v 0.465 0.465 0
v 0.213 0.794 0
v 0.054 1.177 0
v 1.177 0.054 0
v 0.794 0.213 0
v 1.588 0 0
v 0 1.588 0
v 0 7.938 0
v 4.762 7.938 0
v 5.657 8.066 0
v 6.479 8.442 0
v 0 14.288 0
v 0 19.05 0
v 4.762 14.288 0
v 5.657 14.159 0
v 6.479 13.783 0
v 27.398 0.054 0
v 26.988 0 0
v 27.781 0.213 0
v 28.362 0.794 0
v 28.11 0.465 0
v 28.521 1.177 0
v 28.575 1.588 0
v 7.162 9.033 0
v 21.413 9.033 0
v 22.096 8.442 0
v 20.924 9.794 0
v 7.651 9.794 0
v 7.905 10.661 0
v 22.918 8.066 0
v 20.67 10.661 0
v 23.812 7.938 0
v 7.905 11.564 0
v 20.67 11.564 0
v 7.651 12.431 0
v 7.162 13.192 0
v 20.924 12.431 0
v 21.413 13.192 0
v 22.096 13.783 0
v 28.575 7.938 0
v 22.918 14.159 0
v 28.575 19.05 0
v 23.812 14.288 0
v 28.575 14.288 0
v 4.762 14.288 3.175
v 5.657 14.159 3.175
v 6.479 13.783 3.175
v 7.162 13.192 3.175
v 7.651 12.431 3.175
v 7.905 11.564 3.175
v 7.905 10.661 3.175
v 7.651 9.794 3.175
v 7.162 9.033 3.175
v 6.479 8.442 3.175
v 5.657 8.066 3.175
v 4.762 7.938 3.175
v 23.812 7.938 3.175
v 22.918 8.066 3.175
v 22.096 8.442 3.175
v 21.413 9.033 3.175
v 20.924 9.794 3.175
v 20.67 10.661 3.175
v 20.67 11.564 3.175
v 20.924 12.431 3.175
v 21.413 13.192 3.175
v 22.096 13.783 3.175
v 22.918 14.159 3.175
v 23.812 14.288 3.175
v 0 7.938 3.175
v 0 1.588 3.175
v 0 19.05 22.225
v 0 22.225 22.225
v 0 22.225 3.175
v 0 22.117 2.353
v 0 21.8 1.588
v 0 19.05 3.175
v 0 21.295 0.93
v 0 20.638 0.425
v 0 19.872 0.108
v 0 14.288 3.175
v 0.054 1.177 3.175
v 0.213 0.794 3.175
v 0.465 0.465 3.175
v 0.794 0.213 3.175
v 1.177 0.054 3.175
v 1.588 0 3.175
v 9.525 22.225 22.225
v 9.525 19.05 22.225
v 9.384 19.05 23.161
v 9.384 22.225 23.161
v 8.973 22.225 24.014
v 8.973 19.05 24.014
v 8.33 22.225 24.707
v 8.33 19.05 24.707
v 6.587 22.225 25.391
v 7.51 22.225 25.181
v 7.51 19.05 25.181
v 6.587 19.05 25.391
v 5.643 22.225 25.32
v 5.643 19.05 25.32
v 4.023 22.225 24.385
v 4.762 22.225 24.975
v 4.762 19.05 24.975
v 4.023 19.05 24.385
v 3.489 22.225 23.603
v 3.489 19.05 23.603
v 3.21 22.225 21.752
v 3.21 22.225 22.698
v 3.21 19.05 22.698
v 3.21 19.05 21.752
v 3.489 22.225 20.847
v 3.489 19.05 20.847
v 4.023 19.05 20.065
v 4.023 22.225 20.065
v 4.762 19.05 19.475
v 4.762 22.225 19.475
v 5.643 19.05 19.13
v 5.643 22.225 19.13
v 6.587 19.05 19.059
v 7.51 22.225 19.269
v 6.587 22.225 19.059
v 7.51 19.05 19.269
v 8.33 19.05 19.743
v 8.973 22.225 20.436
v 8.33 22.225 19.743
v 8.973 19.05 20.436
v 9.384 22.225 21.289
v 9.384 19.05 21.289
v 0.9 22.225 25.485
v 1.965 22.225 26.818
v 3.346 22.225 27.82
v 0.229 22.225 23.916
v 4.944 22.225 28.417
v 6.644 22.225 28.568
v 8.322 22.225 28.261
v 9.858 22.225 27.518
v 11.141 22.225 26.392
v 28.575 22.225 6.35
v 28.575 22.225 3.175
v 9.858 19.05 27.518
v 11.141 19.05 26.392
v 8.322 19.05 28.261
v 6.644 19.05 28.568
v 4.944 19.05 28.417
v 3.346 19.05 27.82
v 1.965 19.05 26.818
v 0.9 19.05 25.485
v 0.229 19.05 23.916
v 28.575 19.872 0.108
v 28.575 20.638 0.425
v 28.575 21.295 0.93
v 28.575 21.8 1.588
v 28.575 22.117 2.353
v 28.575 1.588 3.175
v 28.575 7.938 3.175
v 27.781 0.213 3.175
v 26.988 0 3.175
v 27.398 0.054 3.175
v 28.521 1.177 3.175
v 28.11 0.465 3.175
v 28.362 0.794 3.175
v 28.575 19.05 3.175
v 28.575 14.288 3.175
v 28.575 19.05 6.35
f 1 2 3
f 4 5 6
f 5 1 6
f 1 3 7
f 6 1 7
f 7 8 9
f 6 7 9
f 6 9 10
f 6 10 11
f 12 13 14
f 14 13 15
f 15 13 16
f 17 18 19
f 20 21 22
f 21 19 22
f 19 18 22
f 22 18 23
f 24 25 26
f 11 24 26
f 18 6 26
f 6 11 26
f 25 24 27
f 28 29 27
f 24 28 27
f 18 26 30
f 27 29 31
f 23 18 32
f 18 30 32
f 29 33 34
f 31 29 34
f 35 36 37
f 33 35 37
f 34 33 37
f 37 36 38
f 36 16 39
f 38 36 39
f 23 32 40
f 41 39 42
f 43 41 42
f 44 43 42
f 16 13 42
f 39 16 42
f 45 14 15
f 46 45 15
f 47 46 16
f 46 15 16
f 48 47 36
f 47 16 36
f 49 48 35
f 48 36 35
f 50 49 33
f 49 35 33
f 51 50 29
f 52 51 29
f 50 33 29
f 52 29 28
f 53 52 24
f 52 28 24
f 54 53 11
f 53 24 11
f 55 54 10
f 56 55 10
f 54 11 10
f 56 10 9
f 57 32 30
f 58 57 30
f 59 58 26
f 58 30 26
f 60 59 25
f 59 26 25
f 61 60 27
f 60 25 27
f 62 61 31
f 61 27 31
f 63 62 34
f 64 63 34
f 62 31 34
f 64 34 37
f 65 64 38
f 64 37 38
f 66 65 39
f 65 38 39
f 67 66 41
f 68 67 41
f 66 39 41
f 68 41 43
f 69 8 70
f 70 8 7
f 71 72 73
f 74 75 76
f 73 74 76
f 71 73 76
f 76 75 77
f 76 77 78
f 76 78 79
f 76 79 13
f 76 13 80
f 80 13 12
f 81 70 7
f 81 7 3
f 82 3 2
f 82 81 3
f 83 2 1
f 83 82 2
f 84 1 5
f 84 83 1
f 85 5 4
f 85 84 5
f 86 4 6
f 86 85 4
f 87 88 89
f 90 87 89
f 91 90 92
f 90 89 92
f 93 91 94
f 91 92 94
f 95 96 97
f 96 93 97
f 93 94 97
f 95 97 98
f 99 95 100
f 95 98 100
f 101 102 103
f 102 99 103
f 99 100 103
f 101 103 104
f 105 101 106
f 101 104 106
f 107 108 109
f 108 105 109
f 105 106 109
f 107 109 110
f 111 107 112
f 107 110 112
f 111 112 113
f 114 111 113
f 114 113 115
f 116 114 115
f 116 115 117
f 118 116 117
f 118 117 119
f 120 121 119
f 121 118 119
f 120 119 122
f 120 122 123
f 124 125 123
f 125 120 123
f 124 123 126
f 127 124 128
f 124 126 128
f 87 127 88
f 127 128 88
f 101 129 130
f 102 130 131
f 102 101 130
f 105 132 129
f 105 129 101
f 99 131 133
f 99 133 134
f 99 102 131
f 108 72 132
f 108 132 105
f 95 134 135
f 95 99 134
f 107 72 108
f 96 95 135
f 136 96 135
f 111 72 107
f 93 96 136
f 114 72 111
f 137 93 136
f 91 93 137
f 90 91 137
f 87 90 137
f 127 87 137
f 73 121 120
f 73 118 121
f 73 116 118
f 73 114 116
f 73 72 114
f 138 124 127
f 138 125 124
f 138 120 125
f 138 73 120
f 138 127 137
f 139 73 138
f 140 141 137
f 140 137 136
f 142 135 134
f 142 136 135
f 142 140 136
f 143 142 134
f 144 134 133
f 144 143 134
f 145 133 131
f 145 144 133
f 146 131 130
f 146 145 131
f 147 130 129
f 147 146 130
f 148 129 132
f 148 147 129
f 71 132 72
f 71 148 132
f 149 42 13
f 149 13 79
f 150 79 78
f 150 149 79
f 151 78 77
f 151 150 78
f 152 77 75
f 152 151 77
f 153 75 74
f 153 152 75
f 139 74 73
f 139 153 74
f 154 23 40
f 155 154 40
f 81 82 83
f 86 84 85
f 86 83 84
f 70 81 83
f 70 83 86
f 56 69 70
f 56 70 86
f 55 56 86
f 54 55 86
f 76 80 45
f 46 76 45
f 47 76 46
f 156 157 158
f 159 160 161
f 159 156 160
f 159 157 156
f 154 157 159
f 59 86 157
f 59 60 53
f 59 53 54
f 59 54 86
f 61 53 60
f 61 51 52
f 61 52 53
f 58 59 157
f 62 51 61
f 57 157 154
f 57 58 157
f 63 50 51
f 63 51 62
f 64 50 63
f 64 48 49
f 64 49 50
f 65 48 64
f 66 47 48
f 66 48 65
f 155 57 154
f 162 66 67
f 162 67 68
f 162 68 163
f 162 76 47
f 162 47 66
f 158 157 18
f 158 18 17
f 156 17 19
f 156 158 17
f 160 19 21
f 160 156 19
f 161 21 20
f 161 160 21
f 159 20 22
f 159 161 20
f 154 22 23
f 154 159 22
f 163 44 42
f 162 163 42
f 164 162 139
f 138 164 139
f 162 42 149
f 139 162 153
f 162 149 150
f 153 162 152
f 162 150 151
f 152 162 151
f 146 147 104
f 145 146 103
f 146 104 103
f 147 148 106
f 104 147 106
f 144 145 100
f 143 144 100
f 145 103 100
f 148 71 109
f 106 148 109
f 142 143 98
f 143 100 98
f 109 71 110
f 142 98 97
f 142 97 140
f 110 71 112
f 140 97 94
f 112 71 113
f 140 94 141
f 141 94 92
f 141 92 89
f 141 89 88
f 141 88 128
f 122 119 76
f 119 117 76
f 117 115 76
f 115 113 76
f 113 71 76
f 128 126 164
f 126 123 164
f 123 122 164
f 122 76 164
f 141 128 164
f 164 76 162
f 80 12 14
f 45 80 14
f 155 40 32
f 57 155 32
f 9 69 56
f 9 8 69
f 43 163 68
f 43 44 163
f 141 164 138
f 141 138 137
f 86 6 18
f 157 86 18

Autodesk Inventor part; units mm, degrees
ref_plane "YZ Plane" through (0, 0, 0) normal (1, 0, 0) x (0, 1, 0)
ref_plane "XZ Plane" through (0, 0, 0) normal (0, 1, 0) x (-1, 0, 0)
ref_plane "XY Plane" through (0, 0, 0) normal (0, 0, 1) x (1, 0, 0)
sketch "Sketch1" plane through (0, 0, 0) normal (0, 0, 1) x (1, 0, 0)
  line L0 (0, 0) -> (28.575, 0)
  line L1 (28.575, 0) -> (28.575, 19.05)
  line L2 (28.575, 19.05) -> (0, 19.05)
  line L3 (0, 19.05) -> (0, 0)
  arc A0 (23.8125, 14.2875) -> (23.8125, 7.9375) centre (23.8125, 11.1125) ccw
  arc A1 (4.7625, 7.9375) -> (4.7625, 14.2875) centre (4.7625, 11.1125) ccw
  line L4 (0, 7.9375) -> (4.7625, 7.9375)
  line L5 (0, 14.2875) -> (4.7625, 14.2875)
  line L6 (28.575, 14.2875) -> (23.8125, 14.2875)
  line L7 (28.575, 7.9375) -> (23.8125, 7.9375)
  dimension "d4" = 28.575
  dimension "d5" = 19.05
  dimension "d18" = 7.9375
  dimension "d19" = 4.7625
  dimension "d20" = 7.9375
  dimension "d21" = 4.7625
  dimension "d22" = 6.35
  dimension "d23" = 6.35
  dimension "d24" = 4.7625
  dimension "d25" = 4.7625
  dimension "d26" = 4.7625
  dimension "d27" = 4.7625
extrude "Extrusion1" add sketch "Sketch1" along normal blind 3.175
sketch "Sketch3" plane through (0, 19.05, 0) normal (0, 1, 0) x (1, 0, 0)
  line L0 (0, 0) -> (28.575, 0) projected
  line L1 (0, 0) -> (28.575, 0)
  line L2 (28.575, 0) -> (28.575, -6.35)
  line L3 (28.575, -6.35) -> (0, -6.35)
  line L4 (0, 0) -> (0, -3.175) projected
  line L5 (0, 0) -> (0, -22.225)
  circle A0 centre (6.35, -22.225) radius 6.35
  line L6 (28.575, -6.35) -> (11.1411, -26.3925)
  circle A1 centre (6.35, -22.225) radius 3.175
  dimension "d6" = 6.35
  dimension "d8" = 22.225
  dimension "d10" = 28.575
  dimension "d12" = 12.7
  dimension "d13" = 6.35
  dimension "d16" = 6.35
extrude "Extrusion2" add sketch "Sketch3" along normal blind 3.175
fillet "Fillet1" radius 3.175 1 edges at (14.2875, 22.225, 0)
sketch "Sketch4" plane through (0, 0, 0) normal (0, 0, -1) x (-1, 0, 0)
  arc A0 (-23.8125, 7.9375) -> (-23.8125, 14.2875) centre (-23.8125, 11.1125) ccw
  arc A1 (-4.7625, 14.2875) -> (-4.7625, 7.9375) centre (-4.7625, 11.1125) ccw
  line L0 (-28.575, 19.05) -> (0, 19.05) projected
  line L1 (-28.575, 0) -> (-28.575, 19.05) projected
  line L2 (0, 0) -> (0, 19.05) projected
  line L3 (-28.575, 0) -> (-28.575, 19.05) projected
  line L4 (-28.575, 14.2875) -> (-23.8125, 14.2875)
  line L5 (-28.575, 7.9375) -> (-23.8125, 7.9375)
  line L6 (0, 19.05) -> (0, 0) projected
  line L7 (0, 14.2875) -> (-4.7625, 14.2875)
  line L8 (0, 7.9375) -> (-4.7625, 7.9375)
  dimension "d28" = 6.35
  dimension "d29" = 6.35
  dimension "d30" = 7.9375
  dimension "d31" = 7.9375
  dimension "d32" = 4.7625
  dimension "d33" = 4.7625
  dimension "d34" = 4.7625
  dimension "d35" = 4.7625
  dimension "d36" = 4.7625
  dimension "d38" = 4.7625
extrude "Extrusion3" cut sketch "Sketch4" against normal through all
fillet "Fillet2" radius 1.5875 2 edges at (28.575, 0, 1.5875) (0, 0, 1.5875)
equation "\"d23\" = d22"
equation "\"d24\" = d21"
equation "\"d26\" = d19"
equation "\"d27\" = d19"
equation "\"d29\" = d28"
equation "\"d31\" = d30"
equation "\"d34\" = d32"
equation "\"d35\" = d32"
equation "\"d36\" = d33"
equation "\"d38\" = d33"
properties part number "LeftAngleBracket-1111-2018" material "Aluminum 6061"
